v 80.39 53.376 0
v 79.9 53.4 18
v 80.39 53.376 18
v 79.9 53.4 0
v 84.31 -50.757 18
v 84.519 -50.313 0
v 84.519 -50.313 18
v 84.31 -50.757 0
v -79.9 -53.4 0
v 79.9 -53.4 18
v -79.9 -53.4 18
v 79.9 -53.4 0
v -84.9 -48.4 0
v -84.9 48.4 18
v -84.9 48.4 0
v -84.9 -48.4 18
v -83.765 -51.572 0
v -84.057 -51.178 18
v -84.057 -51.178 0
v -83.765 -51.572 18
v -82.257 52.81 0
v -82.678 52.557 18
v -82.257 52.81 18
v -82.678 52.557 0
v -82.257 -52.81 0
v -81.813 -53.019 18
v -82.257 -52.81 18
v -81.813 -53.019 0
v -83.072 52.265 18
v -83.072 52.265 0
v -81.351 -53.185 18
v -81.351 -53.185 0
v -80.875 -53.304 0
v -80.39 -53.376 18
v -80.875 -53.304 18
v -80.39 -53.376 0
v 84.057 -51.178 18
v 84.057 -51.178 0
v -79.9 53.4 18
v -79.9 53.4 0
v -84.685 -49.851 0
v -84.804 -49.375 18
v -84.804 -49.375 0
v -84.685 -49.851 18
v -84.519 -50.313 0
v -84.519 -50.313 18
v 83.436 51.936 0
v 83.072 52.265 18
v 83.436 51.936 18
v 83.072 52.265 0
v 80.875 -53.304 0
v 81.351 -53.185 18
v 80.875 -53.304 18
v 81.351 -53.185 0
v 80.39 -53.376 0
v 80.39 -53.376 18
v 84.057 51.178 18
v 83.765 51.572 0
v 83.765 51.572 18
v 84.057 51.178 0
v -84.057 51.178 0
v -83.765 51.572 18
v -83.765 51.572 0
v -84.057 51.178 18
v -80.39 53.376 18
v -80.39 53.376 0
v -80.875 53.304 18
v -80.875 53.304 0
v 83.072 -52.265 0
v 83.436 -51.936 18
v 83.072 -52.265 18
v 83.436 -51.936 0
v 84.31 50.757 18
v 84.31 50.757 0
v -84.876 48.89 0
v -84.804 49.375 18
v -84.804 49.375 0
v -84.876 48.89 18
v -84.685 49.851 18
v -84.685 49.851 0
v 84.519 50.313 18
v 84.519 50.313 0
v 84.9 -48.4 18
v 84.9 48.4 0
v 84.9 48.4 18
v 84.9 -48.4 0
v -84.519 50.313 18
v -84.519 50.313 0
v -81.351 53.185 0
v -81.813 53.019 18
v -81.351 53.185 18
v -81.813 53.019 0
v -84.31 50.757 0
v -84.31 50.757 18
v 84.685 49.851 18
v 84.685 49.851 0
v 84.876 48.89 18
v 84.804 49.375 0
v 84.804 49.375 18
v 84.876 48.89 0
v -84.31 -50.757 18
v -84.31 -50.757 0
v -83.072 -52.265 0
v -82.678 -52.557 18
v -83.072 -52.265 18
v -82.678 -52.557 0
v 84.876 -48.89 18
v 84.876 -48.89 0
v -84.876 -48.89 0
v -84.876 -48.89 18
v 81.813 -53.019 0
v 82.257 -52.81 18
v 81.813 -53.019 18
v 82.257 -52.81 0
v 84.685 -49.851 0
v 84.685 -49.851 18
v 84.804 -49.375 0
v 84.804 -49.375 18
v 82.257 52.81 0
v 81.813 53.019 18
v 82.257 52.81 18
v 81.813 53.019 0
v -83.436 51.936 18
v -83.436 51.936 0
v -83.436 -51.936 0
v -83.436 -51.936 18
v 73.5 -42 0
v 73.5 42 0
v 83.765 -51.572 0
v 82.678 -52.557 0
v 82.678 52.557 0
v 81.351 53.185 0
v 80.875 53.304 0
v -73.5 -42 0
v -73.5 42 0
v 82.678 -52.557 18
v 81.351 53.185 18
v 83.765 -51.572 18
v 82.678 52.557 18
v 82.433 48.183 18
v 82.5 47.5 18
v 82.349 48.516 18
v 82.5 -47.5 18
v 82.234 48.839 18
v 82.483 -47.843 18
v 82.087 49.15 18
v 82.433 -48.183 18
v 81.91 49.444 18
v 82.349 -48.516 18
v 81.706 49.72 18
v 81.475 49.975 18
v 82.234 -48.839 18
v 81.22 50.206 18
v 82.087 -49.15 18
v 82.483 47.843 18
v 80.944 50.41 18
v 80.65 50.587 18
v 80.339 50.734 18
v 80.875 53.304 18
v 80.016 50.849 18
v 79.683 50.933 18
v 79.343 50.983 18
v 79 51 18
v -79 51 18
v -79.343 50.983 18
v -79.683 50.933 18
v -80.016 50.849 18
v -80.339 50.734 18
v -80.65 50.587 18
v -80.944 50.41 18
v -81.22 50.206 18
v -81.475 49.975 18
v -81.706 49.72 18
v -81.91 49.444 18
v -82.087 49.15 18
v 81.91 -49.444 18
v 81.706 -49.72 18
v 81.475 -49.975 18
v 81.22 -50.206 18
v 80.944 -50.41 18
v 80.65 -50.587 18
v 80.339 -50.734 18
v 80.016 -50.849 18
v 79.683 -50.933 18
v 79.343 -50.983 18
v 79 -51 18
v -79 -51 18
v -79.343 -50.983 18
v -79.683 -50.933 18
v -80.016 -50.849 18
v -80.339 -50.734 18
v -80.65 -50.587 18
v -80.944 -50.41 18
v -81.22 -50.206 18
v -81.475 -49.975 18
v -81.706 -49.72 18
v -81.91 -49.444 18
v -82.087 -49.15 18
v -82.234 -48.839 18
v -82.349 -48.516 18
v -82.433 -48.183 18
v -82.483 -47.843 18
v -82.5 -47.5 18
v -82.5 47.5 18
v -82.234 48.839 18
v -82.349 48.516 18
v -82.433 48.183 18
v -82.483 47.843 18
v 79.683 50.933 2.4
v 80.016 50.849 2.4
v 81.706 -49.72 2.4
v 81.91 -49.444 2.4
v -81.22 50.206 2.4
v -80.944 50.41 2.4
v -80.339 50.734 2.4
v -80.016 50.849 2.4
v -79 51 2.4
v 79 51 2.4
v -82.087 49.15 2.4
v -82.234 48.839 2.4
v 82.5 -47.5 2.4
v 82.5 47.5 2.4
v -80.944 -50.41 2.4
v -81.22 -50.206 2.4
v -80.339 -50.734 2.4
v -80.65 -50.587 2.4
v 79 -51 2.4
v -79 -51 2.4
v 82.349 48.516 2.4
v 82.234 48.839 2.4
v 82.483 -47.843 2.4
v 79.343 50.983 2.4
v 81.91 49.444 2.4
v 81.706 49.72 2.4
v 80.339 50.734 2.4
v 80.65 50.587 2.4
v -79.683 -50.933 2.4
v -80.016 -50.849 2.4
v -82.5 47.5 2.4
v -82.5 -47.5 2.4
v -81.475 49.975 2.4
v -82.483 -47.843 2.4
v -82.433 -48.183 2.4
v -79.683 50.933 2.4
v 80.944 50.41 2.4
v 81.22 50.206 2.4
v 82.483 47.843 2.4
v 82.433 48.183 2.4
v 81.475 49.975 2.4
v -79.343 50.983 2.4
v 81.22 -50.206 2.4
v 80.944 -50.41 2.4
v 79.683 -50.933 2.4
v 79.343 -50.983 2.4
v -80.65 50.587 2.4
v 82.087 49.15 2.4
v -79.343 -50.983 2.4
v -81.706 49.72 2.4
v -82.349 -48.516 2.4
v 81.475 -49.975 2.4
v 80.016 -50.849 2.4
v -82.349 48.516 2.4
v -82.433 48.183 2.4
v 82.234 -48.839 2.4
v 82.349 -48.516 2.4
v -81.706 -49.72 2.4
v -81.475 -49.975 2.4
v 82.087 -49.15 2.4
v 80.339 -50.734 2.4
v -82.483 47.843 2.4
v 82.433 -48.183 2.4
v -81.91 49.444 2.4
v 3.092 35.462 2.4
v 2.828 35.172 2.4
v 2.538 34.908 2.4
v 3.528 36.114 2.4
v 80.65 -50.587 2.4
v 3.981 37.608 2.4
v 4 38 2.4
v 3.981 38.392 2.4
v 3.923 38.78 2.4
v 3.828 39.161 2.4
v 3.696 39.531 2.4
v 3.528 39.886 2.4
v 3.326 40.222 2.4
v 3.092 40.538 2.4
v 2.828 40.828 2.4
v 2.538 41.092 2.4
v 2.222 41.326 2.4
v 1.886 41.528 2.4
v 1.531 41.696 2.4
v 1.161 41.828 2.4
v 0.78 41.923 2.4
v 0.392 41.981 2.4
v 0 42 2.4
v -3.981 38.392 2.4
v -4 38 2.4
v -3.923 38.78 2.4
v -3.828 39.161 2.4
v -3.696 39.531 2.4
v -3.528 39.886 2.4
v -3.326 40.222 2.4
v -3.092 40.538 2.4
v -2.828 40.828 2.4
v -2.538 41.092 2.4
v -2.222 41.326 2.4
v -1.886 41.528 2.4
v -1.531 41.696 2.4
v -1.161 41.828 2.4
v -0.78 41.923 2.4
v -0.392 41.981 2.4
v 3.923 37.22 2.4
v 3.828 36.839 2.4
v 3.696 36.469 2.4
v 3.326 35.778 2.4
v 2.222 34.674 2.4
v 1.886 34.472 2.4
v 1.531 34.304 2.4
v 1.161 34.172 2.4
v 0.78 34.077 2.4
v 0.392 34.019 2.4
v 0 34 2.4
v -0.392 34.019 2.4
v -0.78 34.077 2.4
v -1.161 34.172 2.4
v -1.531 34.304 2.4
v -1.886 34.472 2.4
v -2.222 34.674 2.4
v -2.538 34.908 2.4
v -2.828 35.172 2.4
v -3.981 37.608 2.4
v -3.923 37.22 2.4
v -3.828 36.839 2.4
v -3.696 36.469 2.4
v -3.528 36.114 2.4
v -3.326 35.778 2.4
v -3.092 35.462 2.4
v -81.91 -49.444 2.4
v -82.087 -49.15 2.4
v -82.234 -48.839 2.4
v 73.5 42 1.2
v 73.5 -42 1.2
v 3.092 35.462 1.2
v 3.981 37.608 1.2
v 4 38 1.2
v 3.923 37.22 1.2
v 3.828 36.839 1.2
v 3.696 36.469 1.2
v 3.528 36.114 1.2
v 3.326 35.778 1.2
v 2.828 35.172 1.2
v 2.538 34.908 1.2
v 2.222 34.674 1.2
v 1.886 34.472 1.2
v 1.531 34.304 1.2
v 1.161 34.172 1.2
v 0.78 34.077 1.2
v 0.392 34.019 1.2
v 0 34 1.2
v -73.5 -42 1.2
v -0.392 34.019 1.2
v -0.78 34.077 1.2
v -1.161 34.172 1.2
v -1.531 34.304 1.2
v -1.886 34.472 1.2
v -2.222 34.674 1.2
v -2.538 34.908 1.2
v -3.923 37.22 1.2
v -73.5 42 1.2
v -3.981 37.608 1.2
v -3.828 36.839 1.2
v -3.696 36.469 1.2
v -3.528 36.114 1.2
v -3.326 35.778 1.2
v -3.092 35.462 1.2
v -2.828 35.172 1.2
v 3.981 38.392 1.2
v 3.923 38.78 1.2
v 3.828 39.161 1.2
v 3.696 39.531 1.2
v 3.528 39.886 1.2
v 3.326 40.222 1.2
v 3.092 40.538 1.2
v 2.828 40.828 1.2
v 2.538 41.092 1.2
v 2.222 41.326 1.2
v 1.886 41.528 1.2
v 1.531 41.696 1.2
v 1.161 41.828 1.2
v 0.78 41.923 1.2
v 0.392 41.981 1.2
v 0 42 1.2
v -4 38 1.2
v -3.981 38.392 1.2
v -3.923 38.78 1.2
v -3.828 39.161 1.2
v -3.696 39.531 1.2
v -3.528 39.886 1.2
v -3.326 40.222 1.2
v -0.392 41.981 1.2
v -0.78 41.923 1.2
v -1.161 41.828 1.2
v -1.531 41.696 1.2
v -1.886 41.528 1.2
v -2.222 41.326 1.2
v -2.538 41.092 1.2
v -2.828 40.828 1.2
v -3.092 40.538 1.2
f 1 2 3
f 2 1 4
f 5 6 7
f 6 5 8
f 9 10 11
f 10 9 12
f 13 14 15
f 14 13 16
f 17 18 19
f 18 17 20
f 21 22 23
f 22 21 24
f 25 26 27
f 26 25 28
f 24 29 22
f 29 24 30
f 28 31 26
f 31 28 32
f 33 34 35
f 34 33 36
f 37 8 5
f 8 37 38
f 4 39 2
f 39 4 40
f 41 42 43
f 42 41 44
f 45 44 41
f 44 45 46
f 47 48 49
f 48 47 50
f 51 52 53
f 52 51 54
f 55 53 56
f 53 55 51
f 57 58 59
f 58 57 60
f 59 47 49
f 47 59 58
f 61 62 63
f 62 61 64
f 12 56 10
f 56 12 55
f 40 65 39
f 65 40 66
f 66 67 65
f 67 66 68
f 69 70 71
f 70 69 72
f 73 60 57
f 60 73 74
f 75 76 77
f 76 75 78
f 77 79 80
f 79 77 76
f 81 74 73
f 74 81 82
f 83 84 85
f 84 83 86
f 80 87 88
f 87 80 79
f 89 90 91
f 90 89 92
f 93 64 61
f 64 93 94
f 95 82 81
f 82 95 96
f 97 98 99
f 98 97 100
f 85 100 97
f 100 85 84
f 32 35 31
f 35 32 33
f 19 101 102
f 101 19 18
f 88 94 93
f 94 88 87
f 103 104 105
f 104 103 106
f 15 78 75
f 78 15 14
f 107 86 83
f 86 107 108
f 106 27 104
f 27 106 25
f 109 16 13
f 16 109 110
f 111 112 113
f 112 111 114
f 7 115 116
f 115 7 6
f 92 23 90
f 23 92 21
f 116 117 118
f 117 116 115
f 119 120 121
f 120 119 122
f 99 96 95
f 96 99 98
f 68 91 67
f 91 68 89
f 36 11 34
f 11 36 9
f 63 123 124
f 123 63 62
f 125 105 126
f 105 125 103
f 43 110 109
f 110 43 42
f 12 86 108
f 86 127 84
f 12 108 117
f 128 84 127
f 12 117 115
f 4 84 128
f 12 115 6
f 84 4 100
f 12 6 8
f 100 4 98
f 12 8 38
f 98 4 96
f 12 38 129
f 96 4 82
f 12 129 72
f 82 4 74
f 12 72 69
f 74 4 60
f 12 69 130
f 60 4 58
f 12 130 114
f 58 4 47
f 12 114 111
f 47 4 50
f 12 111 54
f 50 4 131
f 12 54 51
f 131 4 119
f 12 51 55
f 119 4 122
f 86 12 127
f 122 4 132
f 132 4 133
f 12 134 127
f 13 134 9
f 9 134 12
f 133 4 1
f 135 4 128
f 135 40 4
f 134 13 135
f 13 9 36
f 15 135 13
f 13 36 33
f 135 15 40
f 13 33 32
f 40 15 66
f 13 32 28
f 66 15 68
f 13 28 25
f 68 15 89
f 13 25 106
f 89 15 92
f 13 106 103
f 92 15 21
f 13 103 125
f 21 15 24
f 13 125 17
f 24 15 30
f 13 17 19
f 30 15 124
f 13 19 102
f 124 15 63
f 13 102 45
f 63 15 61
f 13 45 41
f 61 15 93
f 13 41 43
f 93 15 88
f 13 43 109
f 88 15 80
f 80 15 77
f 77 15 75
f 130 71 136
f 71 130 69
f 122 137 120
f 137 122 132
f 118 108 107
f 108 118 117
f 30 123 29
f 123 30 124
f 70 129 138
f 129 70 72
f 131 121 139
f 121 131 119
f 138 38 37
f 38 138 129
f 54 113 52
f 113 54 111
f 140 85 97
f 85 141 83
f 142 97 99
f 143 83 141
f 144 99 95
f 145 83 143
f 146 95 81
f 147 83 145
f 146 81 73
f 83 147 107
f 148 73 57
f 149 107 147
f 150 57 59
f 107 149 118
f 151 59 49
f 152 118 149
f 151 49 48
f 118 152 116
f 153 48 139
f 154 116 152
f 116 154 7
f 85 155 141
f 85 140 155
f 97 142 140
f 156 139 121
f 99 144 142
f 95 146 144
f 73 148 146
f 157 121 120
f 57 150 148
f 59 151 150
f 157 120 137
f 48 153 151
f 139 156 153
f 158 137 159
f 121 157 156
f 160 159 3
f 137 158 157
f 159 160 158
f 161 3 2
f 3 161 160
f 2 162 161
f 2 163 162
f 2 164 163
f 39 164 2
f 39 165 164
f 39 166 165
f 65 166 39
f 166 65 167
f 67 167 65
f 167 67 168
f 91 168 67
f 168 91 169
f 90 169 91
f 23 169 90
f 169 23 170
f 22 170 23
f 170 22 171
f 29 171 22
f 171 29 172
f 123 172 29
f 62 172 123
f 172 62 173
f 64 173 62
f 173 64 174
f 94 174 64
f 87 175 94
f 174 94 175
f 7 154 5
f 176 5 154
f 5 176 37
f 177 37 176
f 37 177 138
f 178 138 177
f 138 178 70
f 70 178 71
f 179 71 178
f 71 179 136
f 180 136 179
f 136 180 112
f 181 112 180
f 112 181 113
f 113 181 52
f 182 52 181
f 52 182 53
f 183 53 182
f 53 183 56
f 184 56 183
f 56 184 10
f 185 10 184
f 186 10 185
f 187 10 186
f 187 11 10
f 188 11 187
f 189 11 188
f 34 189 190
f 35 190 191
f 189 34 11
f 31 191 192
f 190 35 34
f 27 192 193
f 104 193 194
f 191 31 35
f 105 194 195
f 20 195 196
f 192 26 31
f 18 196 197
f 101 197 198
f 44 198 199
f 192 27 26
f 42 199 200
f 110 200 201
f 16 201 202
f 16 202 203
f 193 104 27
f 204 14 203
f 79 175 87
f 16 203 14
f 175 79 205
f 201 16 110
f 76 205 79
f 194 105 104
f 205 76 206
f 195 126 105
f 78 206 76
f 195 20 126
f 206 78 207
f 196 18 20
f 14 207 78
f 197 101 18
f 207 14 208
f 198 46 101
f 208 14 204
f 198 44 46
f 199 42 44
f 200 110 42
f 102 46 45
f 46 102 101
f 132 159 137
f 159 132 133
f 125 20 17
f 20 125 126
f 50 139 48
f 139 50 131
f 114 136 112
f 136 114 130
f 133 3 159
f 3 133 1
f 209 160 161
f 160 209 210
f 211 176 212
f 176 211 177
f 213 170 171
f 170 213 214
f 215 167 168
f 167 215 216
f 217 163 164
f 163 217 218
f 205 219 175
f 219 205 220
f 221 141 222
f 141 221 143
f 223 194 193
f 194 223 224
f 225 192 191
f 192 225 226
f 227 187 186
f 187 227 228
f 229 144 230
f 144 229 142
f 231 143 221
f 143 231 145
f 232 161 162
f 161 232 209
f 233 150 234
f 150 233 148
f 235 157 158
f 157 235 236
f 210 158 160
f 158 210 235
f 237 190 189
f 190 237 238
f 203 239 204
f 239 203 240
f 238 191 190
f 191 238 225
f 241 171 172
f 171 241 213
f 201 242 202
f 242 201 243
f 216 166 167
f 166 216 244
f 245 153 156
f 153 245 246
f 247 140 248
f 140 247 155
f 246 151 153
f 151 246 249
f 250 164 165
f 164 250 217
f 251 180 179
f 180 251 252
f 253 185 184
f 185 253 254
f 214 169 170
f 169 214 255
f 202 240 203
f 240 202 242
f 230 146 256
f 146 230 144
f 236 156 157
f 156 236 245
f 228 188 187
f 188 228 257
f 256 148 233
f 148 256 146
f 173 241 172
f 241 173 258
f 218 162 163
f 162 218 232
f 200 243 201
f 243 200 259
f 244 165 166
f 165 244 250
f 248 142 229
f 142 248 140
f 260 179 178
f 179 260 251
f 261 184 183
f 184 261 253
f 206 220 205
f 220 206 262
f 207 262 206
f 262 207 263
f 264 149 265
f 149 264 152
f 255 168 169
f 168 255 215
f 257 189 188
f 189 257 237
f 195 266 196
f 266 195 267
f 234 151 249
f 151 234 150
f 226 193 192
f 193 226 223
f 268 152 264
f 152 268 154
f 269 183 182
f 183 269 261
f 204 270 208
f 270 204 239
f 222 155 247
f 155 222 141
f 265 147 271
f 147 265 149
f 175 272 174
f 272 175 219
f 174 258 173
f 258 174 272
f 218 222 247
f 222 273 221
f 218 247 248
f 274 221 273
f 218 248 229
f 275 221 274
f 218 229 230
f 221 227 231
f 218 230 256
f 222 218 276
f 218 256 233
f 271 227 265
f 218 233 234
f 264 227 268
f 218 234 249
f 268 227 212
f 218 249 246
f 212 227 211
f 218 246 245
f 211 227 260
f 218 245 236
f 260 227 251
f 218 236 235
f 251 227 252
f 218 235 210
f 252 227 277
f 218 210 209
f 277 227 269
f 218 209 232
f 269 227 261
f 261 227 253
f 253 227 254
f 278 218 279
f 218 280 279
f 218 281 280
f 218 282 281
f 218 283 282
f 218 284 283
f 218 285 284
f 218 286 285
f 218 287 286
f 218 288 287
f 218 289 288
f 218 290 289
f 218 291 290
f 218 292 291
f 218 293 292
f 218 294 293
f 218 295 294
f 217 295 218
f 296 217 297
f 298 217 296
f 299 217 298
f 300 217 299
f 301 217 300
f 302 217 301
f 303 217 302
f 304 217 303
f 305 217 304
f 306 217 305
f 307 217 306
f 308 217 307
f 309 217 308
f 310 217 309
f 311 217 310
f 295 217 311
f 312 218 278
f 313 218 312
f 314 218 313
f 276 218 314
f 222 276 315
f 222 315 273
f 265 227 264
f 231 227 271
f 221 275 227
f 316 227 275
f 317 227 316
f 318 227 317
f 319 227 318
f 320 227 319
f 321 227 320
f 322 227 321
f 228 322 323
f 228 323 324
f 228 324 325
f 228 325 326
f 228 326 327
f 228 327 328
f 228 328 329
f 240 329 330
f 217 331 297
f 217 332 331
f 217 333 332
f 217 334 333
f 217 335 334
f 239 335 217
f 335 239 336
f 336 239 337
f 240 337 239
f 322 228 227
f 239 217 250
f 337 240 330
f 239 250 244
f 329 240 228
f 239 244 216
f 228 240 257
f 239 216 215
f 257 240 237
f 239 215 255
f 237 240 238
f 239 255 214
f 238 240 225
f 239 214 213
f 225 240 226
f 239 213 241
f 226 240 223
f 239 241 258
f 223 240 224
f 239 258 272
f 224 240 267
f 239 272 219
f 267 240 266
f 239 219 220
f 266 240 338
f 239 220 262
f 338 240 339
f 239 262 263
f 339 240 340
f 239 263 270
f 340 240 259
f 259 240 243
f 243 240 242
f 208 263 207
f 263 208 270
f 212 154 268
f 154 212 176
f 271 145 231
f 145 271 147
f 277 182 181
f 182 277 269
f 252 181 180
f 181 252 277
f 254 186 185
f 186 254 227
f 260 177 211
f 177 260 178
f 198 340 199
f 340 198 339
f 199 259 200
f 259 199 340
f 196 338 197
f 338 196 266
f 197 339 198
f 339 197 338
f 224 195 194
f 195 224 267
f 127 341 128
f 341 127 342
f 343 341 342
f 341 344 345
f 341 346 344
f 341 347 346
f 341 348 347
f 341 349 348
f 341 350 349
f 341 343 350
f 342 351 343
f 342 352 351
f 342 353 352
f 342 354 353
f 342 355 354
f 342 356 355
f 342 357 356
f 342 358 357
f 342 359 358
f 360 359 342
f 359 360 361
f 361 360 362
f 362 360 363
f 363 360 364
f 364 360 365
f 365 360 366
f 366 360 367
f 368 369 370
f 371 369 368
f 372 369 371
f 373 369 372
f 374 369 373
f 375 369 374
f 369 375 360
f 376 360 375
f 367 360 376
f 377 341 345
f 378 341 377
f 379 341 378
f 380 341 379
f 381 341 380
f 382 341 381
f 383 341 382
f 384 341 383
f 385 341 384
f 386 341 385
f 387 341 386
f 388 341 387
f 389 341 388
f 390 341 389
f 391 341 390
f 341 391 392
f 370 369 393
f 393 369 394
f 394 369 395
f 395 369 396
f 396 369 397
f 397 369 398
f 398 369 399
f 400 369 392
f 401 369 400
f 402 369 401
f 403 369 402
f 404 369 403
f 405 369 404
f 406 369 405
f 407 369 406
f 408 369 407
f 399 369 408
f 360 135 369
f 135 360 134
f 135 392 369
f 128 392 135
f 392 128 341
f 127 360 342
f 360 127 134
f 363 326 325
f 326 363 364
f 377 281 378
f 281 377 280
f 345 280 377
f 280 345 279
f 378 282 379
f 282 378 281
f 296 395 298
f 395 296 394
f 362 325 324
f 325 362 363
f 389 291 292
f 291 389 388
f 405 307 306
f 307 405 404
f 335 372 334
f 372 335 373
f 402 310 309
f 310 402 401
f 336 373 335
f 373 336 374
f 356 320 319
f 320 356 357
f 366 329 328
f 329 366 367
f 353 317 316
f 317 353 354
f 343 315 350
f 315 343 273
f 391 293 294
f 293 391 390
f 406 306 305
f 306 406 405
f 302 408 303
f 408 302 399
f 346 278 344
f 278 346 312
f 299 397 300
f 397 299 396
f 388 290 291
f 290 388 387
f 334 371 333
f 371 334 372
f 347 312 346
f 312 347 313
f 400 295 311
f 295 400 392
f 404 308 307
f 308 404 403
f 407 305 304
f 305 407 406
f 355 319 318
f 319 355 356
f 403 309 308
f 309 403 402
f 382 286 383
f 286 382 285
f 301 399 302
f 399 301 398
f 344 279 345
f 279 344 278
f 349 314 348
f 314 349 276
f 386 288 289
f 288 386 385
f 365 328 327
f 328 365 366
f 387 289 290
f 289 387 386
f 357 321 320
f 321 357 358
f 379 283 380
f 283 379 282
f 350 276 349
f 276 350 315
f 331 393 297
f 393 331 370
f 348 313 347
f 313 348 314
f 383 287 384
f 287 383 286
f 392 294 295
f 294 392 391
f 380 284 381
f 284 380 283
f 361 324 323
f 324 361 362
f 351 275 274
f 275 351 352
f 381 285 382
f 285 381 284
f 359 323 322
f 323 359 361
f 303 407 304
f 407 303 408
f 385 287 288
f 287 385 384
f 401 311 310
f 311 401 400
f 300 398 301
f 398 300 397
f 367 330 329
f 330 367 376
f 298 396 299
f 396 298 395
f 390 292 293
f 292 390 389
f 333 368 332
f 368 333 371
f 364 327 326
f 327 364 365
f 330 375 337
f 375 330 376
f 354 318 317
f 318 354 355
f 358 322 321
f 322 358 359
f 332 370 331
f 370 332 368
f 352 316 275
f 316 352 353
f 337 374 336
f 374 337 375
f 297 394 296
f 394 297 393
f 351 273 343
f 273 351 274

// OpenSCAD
// Simple enclosure shell for 7-inch 1024x600 display board.
// Adjust dimensions according to your exact PCB and bezel measurements.

$fn = 64;

panel_w = 165;
panel_h = 102;
panel_t = 4;

wall = 2.4;
depth = 18;
bezel = 9;

camera_hole_d = 8;
camera_hole_x = 0;
camera_hole_y = 38;

module rounded_box(w, h, d, r) {
    hull() {
        for (x = [-w/2 + r, w/2 - r])
        for (y = [-h/2 + r, h/2 - r])
        translate([x, y, 0])
            cylinder(h = d, r = r);
    }
}

difference() {
    rounded_box(panel_w + (2 * wall), panel_h + (2 * wall), depth, 5);
    translate([0, 0, wall])
        rounded_box(panel_w, panel_h, depth, 3.5);

    // Front window for active display area.
    translate([0, 0, -0.1])
        cube([panel_w - (2 * bezel), panel_h - (2 * bezel), wall + 0.2], center = true);

    // Camera cutout.
    translate([camera_hole_x, camera_hole_y, -0.1])
        cylinder(h = wall + 0.2, d = camera_hole_d);
}
